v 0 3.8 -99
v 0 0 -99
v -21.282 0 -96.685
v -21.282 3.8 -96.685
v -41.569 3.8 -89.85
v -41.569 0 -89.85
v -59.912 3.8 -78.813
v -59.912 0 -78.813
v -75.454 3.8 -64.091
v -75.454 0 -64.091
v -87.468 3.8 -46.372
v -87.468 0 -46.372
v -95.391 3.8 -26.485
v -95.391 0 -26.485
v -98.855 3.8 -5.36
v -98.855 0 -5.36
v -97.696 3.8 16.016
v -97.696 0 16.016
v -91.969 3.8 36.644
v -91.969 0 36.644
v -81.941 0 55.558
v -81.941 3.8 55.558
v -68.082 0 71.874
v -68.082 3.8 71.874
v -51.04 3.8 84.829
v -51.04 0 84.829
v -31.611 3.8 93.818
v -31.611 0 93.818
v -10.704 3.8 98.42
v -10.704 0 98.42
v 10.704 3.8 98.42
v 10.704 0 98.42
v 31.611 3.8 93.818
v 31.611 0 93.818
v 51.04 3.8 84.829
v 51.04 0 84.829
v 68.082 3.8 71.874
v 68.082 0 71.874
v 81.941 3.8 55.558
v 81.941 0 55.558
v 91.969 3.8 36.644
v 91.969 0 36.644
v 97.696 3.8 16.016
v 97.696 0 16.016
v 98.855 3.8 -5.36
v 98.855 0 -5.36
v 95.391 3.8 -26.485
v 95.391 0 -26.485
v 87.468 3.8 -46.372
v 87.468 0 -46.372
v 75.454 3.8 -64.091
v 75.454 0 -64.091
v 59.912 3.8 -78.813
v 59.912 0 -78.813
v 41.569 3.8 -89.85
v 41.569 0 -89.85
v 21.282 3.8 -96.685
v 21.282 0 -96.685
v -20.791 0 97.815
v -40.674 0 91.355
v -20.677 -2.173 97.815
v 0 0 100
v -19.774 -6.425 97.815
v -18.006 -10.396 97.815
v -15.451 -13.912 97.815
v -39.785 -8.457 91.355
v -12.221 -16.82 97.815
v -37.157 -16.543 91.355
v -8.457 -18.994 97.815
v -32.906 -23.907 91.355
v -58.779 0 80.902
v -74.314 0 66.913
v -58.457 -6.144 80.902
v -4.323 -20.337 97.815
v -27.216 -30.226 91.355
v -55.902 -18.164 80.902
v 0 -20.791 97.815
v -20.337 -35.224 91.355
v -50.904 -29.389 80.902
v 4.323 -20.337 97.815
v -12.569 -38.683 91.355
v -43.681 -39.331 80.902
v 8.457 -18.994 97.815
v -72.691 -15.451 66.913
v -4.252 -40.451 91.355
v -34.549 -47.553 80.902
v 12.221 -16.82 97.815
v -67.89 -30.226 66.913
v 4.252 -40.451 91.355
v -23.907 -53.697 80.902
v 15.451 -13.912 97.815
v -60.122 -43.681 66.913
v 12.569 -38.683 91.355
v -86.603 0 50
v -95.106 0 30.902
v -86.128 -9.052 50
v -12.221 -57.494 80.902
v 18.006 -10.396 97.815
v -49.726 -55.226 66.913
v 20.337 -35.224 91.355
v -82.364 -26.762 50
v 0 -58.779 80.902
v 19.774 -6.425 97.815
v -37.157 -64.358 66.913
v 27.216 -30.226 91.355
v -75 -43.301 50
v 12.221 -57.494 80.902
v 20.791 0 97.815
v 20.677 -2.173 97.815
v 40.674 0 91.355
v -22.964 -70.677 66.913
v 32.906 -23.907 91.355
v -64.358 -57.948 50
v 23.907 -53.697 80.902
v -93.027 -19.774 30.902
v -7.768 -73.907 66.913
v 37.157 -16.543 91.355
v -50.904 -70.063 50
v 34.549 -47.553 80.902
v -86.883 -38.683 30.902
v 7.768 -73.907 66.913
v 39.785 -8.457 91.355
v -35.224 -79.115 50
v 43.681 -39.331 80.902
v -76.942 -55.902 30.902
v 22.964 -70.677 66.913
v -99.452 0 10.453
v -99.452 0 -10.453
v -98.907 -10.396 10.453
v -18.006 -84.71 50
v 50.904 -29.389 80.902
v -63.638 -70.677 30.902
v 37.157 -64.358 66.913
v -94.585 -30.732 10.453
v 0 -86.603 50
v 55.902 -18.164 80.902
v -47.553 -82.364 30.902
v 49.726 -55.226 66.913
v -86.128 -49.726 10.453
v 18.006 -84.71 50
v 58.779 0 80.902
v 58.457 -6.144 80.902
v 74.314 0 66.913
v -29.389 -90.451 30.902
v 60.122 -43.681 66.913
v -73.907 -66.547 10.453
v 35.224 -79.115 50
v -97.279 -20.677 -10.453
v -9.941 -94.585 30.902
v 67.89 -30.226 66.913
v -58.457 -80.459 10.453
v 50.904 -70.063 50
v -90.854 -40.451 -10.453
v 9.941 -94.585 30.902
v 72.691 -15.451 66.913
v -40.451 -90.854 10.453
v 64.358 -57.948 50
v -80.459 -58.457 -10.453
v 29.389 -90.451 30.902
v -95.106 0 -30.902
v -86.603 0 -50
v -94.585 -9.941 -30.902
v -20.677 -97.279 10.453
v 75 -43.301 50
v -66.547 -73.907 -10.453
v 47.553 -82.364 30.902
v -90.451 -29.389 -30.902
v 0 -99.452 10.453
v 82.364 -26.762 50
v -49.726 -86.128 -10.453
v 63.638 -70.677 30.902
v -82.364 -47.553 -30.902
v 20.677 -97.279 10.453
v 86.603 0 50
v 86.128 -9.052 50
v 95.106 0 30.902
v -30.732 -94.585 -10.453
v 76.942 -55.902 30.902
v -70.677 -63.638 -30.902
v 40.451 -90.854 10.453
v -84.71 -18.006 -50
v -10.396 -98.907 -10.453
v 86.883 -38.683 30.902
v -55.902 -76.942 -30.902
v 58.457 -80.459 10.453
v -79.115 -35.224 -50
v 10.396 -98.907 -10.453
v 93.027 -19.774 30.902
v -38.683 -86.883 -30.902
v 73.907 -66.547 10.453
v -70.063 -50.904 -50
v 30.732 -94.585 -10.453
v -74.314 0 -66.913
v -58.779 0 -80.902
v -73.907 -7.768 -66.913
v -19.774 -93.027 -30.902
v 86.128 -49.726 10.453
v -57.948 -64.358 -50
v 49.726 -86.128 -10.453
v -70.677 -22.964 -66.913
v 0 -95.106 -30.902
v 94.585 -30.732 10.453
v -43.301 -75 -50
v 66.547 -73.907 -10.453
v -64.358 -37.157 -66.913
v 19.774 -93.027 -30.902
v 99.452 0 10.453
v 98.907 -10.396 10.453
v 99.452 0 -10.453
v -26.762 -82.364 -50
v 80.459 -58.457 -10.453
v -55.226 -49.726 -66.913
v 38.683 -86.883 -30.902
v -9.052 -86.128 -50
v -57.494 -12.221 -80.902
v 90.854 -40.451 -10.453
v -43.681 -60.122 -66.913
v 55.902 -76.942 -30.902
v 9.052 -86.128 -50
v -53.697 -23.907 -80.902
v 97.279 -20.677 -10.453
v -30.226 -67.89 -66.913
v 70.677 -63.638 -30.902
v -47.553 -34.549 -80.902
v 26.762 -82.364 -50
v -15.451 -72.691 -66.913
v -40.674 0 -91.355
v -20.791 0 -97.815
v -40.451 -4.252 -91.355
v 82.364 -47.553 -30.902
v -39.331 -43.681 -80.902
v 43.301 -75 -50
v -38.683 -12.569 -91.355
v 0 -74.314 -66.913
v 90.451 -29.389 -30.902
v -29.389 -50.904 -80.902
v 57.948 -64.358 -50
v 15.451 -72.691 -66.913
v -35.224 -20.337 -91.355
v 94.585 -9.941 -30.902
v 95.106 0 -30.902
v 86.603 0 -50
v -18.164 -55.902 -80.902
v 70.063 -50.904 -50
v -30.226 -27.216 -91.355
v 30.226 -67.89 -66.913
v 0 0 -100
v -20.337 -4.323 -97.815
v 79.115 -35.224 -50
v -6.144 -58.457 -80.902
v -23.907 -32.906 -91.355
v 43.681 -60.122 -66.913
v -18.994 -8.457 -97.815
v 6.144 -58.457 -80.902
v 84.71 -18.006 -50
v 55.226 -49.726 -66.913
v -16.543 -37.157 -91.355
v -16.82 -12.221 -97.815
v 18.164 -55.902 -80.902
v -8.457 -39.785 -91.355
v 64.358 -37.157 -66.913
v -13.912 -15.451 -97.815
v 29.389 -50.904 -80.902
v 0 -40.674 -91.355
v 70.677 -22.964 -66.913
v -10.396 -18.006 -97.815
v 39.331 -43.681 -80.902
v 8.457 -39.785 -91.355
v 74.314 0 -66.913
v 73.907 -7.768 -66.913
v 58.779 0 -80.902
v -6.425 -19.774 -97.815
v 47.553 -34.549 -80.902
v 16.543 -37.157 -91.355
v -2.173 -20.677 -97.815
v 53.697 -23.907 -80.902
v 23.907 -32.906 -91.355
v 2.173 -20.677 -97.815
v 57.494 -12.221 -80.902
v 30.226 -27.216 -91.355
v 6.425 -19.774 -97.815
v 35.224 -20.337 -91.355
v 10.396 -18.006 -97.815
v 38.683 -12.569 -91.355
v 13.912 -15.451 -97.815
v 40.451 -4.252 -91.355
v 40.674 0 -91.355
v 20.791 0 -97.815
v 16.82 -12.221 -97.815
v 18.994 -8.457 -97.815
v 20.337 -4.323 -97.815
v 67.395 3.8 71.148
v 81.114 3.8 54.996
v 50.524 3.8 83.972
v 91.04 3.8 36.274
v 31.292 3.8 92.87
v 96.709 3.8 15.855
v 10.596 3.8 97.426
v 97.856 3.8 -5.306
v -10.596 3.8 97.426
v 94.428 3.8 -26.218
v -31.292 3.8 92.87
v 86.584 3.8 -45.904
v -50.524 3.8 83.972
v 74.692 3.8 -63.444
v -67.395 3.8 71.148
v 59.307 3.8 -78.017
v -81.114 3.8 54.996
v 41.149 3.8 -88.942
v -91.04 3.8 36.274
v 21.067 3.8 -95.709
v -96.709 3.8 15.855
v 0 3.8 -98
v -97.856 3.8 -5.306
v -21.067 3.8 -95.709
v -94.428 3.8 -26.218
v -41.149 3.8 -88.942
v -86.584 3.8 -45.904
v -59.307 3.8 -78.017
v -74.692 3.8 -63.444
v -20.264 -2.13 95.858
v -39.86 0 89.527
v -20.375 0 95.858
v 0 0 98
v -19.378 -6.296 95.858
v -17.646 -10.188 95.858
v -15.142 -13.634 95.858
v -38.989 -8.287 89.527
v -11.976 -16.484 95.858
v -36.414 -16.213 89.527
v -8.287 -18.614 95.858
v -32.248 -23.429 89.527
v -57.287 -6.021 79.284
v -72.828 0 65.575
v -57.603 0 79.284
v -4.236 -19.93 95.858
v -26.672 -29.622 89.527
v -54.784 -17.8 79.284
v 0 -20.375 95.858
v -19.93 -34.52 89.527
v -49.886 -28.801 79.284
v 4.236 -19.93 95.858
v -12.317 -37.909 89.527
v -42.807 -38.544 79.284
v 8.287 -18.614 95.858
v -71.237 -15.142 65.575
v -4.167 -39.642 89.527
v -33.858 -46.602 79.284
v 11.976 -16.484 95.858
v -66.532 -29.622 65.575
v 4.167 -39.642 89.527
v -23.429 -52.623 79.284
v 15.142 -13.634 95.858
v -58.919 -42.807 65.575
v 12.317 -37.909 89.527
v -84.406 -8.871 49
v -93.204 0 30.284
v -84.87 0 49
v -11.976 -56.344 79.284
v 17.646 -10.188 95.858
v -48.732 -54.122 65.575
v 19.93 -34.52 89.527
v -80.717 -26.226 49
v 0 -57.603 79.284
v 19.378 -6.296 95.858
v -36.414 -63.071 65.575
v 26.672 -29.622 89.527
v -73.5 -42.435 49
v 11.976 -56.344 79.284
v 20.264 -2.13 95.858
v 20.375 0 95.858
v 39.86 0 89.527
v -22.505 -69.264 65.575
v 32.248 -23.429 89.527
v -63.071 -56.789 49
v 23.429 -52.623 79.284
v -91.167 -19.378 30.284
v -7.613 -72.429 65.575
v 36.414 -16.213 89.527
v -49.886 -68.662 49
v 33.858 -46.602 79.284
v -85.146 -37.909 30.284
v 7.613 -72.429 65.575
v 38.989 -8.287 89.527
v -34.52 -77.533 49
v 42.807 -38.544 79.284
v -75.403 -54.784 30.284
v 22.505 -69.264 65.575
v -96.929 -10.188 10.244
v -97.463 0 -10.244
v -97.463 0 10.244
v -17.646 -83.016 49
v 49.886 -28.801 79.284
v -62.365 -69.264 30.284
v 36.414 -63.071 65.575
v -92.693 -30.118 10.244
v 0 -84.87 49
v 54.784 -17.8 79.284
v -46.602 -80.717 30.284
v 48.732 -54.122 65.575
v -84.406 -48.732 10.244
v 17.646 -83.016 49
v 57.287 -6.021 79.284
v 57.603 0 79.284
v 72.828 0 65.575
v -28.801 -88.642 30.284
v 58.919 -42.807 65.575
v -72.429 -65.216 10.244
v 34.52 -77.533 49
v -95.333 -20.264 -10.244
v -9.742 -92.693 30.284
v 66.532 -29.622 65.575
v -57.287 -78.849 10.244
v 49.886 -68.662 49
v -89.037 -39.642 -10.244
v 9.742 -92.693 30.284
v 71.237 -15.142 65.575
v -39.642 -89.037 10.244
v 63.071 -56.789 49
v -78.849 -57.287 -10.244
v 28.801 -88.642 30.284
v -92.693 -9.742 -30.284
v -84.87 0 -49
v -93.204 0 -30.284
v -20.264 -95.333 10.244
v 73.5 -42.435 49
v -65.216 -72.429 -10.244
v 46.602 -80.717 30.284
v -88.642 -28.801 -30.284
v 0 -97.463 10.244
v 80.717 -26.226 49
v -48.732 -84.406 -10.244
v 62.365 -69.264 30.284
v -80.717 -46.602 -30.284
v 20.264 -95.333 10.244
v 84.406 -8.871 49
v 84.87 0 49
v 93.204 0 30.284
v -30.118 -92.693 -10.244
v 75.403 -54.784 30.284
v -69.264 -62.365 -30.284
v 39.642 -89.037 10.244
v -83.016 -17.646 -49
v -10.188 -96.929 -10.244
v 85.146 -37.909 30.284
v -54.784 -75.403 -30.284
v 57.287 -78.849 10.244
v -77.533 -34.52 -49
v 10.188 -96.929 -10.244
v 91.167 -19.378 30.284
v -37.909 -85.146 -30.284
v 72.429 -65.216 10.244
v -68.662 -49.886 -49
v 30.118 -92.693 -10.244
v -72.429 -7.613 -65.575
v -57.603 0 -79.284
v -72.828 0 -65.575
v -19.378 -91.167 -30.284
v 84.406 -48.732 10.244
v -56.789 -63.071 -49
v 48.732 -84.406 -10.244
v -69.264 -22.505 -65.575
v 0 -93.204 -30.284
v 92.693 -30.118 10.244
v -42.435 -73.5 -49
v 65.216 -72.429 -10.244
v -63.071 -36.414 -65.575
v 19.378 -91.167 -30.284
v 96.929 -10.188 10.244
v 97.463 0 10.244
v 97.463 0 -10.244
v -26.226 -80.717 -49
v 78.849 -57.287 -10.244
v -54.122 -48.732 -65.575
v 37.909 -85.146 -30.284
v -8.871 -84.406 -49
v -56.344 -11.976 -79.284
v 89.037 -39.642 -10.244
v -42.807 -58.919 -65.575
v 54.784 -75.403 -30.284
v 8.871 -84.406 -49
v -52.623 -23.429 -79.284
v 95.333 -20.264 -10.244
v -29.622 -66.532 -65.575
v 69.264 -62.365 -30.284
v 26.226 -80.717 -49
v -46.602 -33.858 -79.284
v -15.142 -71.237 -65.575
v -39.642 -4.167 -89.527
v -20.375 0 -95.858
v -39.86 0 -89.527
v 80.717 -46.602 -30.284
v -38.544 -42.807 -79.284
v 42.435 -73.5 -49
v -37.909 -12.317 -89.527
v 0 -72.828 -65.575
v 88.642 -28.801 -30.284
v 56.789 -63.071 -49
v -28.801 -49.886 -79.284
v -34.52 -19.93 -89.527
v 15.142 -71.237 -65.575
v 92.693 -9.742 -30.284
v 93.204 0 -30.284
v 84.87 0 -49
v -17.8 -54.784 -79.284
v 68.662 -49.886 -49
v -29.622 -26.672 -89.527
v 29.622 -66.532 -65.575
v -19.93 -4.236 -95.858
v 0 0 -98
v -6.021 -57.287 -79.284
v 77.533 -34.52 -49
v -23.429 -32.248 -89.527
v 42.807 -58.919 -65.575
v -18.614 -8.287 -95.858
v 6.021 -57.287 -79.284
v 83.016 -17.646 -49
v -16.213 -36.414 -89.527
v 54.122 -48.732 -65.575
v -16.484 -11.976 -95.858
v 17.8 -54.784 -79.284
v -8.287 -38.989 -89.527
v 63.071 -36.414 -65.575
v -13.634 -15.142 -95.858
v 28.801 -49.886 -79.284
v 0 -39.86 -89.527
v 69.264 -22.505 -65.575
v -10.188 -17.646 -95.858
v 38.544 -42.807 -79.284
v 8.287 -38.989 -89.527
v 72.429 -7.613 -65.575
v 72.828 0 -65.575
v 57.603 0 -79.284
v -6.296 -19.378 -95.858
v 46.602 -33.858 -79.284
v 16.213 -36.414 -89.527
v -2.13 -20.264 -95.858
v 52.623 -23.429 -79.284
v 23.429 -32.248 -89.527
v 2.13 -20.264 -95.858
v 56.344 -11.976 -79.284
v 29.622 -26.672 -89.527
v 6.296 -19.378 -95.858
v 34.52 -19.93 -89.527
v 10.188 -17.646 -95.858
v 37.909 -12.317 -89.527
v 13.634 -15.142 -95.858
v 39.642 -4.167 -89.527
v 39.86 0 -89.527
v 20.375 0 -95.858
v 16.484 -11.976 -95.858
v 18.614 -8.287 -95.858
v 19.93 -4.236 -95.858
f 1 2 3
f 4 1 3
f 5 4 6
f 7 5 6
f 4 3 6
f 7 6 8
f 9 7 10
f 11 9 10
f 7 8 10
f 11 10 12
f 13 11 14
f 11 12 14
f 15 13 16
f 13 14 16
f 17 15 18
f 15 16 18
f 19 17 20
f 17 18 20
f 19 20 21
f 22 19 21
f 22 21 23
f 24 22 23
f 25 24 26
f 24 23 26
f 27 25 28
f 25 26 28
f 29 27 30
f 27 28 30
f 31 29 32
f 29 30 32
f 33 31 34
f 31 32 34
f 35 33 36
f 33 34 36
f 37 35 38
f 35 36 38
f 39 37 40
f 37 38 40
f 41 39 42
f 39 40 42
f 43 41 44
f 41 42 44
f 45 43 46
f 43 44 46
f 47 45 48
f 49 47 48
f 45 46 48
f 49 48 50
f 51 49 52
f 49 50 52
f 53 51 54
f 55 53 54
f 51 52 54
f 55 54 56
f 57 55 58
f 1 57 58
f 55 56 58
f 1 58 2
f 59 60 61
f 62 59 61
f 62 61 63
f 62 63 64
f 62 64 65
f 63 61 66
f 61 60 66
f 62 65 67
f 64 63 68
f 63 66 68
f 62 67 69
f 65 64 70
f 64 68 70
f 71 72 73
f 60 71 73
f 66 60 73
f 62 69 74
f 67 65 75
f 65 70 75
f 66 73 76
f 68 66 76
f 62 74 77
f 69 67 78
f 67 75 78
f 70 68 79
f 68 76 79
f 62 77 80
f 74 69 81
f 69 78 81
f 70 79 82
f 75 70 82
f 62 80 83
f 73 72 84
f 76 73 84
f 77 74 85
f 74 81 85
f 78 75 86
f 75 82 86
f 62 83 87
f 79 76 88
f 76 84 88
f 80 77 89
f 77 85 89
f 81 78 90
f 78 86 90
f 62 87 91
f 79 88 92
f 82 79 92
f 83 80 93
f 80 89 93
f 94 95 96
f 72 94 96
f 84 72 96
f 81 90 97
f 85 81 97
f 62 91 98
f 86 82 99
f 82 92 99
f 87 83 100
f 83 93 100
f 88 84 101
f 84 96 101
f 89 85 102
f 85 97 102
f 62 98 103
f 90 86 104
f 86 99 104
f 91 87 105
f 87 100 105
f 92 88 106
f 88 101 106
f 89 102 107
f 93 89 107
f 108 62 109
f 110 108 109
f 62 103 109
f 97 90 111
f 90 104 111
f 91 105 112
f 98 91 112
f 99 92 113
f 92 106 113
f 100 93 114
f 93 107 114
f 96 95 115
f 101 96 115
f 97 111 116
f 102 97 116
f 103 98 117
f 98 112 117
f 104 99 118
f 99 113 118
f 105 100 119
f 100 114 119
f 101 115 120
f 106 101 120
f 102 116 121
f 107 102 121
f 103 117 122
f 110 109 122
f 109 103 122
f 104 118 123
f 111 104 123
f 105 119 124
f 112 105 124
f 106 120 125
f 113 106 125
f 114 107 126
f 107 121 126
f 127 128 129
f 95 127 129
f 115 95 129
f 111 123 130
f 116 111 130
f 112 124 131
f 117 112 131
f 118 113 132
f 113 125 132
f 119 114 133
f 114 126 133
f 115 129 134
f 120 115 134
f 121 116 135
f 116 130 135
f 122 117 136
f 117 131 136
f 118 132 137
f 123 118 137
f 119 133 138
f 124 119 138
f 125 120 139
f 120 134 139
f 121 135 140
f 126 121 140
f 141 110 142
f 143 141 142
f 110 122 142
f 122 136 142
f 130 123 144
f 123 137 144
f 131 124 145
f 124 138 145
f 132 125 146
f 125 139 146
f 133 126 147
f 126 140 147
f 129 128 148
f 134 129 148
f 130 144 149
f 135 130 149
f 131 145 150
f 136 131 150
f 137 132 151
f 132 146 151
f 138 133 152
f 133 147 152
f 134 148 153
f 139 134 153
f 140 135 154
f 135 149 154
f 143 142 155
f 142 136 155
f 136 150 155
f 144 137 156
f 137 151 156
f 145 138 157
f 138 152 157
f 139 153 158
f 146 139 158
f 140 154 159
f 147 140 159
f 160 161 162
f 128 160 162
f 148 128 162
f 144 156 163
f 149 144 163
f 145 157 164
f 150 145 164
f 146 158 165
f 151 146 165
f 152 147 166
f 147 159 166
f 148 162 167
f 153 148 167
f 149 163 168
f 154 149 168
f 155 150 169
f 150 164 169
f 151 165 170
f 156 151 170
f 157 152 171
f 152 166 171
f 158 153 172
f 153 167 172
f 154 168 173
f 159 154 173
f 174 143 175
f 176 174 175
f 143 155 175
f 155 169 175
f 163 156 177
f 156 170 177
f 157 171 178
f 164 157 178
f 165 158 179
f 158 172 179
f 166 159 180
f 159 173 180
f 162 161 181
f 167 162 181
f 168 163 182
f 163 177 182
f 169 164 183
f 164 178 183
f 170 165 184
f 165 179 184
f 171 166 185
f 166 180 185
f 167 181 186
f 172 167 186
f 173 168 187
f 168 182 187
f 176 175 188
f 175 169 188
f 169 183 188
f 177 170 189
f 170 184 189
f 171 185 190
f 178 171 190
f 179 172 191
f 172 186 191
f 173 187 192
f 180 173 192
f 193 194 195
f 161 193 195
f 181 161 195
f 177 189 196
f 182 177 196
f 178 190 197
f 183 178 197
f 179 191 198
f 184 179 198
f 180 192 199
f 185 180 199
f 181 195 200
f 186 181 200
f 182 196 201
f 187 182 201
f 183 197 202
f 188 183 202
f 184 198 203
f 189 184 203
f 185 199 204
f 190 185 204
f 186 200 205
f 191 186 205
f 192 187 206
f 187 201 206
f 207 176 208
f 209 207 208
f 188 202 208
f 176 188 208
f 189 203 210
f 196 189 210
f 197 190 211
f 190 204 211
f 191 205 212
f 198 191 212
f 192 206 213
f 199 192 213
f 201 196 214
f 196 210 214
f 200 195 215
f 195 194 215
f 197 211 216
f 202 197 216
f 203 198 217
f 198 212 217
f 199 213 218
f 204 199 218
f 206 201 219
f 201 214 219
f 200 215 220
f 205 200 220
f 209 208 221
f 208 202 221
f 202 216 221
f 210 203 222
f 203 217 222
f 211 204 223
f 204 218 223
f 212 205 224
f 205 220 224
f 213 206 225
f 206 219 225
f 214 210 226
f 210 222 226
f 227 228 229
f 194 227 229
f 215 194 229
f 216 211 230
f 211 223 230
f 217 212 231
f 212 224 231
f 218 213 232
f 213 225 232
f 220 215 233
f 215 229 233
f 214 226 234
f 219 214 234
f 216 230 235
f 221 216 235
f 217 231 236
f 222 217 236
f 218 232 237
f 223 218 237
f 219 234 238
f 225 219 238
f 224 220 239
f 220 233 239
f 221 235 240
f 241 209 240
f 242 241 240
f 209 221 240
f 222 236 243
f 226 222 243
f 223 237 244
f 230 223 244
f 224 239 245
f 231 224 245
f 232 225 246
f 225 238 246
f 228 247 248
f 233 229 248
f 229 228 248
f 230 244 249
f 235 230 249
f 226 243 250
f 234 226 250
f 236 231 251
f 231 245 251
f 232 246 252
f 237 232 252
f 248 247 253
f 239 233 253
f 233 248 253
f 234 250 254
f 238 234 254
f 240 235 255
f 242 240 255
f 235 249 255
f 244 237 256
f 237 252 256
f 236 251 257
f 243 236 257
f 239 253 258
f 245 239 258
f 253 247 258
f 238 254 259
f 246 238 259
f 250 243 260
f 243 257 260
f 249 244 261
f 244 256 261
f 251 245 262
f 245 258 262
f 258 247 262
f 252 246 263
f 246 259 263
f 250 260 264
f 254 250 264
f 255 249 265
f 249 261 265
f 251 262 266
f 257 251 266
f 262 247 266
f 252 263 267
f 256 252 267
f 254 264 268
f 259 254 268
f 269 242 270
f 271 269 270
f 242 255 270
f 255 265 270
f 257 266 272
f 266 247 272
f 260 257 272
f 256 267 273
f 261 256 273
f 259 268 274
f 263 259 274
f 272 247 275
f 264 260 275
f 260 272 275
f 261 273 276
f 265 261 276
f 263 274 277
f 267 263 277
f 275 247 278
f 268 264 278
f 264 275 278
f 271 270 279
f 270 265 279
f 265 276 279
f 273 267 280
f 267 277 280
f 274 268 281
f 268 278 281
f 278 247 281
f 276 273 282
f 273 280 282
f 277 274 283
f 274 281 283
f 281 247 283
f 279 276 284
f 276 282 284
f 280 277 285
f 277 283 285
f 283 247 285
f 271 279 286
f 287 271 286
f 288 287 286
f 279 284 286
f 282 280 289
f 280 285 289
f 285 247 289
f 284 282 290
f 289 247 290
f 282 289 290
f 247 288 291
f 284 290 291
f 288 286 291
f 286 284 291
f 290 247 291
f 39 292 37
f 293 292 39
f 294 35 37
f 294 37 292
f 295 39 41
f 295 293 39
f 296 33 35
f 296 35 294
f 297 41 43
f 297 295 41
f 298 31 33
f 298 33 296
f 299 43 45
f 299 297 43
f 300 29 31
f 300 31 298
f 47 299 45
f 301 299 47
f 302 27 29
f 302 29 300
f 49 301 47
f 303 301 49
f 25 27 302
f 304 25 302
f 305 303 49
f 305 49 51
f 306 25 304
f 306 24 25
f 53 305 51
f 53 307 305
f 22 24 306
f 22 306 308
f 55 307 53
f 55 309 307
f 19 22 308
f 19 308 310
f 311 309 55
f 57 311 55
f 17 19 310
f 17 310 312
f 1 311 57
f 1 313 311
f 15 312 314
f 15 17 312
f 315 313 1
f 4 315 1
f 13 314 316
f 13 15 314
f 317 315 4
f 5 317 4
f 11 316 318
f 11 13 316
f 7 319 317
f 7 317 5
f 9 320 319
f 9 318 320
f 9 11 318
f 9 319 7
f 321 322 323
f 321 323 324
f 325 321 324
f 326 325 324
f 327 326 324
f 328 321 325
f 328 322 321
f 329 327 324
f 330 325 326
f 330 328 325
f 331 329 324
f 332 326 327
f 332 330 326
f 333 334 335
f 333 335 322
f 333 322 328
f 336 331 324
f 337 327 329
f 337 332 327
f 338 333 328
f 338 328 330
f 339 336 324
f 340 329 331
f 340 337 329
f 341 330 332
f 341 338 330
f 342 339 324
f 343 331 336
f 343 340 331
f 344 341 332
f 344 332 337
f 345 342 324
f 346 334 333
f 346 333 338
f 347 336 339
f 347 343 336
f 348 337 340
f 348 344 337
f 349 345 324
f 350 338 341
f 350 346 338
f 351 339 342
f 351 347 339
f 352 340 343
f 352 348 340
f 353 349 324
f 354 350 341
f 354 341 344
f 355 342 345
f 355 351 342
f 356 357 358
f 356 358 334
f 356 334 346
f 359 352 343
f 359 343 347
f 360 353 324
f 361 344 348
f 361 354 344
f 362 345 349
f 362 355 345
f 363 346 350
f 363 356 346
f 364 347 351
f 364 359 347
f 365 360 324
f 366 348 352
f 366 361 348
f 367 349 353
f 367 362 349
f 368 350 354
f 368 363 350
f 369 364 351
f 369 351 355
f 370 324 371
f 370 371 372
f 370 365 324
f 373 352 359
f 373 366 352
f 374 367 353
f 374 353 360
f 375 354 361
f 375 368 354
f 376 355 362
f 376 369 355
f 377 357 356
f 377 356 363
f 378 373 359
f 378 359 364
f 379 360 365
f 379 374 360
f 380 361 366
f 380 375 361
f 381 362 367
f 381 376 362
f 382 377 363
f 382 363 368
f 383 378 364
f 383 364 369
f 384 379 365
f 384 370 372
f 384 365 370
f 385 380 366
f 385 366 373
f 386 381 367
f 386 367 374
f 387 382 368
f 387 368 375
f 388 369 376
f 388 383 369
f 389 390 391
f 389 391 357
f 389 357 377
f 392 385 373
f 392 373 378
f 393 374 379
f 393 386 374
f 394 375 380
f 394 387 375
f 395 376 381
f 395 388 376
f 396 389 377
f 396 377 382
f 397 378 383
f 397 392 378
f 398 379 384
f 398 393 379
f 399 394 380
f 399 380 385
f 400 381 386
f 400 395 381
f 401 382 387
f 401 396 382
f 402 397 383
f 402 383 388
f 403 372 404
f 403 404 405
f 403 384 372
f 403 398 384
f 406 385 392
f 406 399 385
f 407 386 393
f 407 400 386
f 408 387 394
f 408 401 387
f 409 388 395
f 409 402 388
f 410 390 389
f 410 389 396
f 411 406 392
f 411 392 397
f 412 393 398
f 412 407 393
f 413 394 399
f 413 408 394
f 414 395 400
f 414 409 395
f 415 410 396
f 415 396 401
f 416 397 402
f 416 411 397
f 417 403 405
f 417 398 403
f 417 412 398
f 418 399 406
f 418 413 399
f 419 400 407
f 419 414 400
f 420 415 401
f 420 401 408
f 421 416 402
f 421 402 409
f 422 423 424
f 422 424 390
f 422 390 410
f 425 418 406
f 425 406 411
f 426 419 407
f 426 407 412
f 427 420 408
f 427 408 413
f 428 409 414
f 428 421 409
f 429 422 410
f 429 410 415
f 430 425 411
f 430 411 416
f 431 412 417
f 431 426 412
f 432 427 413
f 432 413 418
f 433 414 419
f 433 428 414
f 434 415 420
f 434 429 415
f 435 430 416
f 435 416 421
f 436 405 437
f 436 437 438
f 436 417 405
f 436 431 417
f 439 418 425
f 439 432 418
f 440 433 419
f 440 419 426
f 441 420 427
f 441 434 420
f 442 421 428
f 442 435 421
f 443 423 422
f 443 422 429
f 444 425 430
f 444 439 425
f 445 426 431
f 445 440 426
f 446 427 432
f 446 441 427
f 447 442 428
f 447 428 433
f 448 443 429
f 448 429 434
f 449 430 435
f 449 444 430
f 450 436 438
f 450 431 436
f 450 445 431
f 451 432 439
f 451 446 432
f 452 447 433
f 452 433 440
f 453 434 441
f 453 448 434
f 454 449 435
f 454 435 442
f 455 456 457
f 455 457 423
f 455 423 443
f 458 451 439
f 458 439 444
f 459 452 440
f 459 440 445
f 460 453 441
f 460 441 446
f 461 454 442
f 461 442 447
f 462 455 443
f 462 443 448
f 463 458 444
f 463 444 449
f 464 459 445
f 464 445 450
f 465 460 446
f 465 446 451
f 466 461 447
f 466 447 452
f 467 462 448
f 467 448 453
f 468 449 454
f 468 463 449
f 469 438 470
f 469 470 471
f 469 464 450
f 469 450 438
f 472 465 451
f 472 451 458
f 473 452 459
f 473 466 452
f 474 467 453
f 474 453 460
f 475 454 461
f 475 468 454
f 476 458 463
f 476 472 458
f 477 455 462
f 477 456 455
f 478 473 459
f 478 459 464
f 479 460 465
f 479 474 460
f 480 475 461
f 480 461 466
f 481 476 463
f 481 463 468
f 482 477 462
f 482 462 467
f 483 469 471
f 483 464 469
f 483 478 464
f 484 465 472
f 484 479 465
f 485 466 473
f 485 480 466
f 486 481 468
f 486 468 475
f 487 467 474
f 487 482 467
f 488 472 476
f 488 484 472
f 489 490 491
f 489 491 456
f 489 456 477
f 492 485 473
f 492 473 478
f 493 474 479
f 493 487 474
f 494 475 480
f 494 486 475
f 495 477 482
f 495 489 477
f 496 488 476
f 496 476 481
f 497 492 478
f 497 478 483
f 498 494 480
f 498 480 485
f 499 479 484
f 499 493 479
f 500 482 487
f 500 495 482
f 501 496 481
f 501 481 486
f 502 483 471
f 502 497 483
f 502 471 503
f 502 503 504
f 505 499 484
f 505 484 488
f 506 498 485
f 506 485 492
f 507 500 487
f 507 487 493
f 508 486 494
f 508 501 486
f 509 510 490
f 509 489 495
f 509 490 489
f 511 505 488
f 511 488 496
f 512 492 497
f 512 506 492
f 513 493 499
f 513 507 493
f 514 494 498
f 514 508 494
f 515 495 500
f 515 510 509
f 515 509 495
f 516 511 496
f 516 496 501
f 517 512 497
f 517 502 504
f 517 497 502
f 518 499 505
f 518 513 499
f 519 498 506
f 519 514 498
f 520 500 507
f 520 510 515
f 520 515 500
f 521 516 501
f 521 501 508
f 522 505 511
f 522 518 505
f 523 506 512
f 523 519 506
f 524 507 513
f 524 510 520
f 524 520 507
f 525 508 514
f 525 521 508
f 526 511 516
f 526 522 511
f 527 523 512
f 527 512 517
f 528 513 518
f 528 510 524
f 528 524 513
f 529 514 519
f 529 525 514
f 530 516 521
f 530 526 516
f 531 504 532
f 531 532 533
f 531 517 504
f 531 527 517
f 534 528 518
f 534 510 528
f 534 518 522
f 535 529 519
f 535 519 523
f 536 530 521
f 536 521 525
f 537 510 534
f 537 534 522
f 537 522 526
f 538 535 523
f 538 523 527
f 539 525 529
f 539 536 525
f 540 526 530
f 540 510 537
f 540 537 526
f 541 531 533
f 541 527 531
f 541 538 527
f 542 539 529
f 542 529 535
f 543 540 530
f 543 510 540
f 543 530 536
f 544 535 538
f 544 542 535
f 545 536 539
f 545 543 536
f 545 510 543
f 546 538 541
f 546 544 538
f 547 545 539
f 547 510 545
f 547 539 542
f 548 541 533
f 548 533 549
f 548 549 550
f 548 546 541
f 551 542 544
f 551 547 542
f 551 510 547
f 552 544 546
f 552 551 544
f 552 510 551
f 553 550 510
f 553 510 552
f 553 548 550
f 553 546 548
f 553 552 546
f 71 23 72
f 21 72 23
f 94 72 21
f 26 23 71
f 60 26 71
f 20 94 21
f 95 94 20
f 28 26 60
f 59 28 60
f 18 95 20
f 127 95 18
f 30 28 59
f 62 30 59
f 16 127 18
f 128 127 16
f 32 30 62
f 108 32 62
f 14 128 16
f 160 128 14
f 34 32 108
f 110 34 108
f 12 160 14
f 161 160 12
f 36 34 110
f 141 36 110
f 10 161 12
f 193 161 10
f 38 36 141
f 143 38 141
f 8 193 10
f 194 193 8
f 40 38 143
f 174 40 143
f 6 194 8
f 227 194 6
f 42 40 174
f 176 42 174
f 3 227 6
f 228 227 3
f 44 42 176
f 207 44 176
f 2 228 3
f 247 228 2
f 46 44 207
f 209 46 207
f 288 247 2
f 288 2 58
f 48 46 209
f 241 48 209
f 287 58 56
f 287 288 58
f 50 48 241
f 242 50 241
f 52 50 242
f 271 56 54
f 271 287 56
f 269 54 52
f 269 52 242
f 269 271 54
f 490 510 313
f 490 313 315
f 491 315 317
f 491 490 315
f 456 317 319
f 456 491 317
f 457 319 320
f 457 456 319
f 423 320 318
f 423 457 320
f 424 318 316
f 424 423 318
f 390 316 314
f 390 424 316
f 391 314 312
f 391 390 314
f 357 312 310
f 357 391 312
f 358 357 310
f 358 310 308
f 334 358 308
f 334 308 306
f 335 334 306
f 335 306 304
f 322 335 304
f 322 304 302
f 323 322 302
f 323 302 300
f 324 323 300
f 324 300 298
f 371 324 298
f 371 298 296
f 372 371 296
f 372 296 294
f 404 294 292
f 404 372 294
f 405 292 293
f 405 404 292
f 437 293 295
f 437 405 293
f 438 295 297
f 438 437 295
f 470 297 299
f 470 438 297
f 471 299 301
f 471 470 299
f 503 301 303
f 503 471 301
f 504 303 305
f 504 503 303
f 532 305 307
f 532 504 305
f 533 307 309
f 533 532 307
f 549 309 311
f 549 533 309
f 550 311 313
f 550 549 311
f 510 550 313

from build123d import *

# Parameters (mm, degrees)
SHELL1_T            = 2
SKETCH2_R           = 125.720178412
CUT_EXTRUDE1_DEPTH  = 156
SKETCH3_R           = 99
SKETCH3_R_2         = 98
BOSS_EXTRUDE1_DEPTH = 3.8


with BuildPart() as part:
    # Sketch1 → Revolve1 (revolve)
    with BuildSketch(Plane(origin=(0, 0, 0), x_dir=(1, 0, 0), z_dir=(0, 1, 0))):
        with BuildLine():
            Line((0, 100), (0, -100))
            ThreePointArc((0, -100), (100, 0), (0, 100))
        make_face()
    revolve(axis=Axis((0, 0, -100), (0, 0, 1)))

    # Shell1 (no face opened: a closed hollow body)
    add(offset(amount=-SHELL1_T, mode=Mode.PRIVATE), mode=Mode.SUBTRACT)

    # Sketch2 → Cut-Extrude1 (cut)
    with BuildSketch(Plane(origin=(0, 0, 0), x_dir=(1, 0, 0), z_dir=(0, 1, 0))):
        Circle(SKETCH2_R)
    extrude(amount=CUT_EXTRUDE1_DEPTH, mode=Mode.SUBTRACT)

    # Sketch3 → Boss-Extrude1 (add)
    with BuildSketch(Plane(origin=(0, 0, 0), x_dir=(1, 0, 0), z_dir=(0, 1, 0))):
        with Locations(Location((0, 0, 0), (0, 0, 90))):
            Circle(SKETCH3_R)
        with Locations(Location((0, 0, 0), (0, 0, 90))):
            Circle(SKETCH3_R_2, mode=Mode.SUBTRACT)
    extrude(amount=BOSS_EXTRUDE1_DEPTH)


solid = part.part
